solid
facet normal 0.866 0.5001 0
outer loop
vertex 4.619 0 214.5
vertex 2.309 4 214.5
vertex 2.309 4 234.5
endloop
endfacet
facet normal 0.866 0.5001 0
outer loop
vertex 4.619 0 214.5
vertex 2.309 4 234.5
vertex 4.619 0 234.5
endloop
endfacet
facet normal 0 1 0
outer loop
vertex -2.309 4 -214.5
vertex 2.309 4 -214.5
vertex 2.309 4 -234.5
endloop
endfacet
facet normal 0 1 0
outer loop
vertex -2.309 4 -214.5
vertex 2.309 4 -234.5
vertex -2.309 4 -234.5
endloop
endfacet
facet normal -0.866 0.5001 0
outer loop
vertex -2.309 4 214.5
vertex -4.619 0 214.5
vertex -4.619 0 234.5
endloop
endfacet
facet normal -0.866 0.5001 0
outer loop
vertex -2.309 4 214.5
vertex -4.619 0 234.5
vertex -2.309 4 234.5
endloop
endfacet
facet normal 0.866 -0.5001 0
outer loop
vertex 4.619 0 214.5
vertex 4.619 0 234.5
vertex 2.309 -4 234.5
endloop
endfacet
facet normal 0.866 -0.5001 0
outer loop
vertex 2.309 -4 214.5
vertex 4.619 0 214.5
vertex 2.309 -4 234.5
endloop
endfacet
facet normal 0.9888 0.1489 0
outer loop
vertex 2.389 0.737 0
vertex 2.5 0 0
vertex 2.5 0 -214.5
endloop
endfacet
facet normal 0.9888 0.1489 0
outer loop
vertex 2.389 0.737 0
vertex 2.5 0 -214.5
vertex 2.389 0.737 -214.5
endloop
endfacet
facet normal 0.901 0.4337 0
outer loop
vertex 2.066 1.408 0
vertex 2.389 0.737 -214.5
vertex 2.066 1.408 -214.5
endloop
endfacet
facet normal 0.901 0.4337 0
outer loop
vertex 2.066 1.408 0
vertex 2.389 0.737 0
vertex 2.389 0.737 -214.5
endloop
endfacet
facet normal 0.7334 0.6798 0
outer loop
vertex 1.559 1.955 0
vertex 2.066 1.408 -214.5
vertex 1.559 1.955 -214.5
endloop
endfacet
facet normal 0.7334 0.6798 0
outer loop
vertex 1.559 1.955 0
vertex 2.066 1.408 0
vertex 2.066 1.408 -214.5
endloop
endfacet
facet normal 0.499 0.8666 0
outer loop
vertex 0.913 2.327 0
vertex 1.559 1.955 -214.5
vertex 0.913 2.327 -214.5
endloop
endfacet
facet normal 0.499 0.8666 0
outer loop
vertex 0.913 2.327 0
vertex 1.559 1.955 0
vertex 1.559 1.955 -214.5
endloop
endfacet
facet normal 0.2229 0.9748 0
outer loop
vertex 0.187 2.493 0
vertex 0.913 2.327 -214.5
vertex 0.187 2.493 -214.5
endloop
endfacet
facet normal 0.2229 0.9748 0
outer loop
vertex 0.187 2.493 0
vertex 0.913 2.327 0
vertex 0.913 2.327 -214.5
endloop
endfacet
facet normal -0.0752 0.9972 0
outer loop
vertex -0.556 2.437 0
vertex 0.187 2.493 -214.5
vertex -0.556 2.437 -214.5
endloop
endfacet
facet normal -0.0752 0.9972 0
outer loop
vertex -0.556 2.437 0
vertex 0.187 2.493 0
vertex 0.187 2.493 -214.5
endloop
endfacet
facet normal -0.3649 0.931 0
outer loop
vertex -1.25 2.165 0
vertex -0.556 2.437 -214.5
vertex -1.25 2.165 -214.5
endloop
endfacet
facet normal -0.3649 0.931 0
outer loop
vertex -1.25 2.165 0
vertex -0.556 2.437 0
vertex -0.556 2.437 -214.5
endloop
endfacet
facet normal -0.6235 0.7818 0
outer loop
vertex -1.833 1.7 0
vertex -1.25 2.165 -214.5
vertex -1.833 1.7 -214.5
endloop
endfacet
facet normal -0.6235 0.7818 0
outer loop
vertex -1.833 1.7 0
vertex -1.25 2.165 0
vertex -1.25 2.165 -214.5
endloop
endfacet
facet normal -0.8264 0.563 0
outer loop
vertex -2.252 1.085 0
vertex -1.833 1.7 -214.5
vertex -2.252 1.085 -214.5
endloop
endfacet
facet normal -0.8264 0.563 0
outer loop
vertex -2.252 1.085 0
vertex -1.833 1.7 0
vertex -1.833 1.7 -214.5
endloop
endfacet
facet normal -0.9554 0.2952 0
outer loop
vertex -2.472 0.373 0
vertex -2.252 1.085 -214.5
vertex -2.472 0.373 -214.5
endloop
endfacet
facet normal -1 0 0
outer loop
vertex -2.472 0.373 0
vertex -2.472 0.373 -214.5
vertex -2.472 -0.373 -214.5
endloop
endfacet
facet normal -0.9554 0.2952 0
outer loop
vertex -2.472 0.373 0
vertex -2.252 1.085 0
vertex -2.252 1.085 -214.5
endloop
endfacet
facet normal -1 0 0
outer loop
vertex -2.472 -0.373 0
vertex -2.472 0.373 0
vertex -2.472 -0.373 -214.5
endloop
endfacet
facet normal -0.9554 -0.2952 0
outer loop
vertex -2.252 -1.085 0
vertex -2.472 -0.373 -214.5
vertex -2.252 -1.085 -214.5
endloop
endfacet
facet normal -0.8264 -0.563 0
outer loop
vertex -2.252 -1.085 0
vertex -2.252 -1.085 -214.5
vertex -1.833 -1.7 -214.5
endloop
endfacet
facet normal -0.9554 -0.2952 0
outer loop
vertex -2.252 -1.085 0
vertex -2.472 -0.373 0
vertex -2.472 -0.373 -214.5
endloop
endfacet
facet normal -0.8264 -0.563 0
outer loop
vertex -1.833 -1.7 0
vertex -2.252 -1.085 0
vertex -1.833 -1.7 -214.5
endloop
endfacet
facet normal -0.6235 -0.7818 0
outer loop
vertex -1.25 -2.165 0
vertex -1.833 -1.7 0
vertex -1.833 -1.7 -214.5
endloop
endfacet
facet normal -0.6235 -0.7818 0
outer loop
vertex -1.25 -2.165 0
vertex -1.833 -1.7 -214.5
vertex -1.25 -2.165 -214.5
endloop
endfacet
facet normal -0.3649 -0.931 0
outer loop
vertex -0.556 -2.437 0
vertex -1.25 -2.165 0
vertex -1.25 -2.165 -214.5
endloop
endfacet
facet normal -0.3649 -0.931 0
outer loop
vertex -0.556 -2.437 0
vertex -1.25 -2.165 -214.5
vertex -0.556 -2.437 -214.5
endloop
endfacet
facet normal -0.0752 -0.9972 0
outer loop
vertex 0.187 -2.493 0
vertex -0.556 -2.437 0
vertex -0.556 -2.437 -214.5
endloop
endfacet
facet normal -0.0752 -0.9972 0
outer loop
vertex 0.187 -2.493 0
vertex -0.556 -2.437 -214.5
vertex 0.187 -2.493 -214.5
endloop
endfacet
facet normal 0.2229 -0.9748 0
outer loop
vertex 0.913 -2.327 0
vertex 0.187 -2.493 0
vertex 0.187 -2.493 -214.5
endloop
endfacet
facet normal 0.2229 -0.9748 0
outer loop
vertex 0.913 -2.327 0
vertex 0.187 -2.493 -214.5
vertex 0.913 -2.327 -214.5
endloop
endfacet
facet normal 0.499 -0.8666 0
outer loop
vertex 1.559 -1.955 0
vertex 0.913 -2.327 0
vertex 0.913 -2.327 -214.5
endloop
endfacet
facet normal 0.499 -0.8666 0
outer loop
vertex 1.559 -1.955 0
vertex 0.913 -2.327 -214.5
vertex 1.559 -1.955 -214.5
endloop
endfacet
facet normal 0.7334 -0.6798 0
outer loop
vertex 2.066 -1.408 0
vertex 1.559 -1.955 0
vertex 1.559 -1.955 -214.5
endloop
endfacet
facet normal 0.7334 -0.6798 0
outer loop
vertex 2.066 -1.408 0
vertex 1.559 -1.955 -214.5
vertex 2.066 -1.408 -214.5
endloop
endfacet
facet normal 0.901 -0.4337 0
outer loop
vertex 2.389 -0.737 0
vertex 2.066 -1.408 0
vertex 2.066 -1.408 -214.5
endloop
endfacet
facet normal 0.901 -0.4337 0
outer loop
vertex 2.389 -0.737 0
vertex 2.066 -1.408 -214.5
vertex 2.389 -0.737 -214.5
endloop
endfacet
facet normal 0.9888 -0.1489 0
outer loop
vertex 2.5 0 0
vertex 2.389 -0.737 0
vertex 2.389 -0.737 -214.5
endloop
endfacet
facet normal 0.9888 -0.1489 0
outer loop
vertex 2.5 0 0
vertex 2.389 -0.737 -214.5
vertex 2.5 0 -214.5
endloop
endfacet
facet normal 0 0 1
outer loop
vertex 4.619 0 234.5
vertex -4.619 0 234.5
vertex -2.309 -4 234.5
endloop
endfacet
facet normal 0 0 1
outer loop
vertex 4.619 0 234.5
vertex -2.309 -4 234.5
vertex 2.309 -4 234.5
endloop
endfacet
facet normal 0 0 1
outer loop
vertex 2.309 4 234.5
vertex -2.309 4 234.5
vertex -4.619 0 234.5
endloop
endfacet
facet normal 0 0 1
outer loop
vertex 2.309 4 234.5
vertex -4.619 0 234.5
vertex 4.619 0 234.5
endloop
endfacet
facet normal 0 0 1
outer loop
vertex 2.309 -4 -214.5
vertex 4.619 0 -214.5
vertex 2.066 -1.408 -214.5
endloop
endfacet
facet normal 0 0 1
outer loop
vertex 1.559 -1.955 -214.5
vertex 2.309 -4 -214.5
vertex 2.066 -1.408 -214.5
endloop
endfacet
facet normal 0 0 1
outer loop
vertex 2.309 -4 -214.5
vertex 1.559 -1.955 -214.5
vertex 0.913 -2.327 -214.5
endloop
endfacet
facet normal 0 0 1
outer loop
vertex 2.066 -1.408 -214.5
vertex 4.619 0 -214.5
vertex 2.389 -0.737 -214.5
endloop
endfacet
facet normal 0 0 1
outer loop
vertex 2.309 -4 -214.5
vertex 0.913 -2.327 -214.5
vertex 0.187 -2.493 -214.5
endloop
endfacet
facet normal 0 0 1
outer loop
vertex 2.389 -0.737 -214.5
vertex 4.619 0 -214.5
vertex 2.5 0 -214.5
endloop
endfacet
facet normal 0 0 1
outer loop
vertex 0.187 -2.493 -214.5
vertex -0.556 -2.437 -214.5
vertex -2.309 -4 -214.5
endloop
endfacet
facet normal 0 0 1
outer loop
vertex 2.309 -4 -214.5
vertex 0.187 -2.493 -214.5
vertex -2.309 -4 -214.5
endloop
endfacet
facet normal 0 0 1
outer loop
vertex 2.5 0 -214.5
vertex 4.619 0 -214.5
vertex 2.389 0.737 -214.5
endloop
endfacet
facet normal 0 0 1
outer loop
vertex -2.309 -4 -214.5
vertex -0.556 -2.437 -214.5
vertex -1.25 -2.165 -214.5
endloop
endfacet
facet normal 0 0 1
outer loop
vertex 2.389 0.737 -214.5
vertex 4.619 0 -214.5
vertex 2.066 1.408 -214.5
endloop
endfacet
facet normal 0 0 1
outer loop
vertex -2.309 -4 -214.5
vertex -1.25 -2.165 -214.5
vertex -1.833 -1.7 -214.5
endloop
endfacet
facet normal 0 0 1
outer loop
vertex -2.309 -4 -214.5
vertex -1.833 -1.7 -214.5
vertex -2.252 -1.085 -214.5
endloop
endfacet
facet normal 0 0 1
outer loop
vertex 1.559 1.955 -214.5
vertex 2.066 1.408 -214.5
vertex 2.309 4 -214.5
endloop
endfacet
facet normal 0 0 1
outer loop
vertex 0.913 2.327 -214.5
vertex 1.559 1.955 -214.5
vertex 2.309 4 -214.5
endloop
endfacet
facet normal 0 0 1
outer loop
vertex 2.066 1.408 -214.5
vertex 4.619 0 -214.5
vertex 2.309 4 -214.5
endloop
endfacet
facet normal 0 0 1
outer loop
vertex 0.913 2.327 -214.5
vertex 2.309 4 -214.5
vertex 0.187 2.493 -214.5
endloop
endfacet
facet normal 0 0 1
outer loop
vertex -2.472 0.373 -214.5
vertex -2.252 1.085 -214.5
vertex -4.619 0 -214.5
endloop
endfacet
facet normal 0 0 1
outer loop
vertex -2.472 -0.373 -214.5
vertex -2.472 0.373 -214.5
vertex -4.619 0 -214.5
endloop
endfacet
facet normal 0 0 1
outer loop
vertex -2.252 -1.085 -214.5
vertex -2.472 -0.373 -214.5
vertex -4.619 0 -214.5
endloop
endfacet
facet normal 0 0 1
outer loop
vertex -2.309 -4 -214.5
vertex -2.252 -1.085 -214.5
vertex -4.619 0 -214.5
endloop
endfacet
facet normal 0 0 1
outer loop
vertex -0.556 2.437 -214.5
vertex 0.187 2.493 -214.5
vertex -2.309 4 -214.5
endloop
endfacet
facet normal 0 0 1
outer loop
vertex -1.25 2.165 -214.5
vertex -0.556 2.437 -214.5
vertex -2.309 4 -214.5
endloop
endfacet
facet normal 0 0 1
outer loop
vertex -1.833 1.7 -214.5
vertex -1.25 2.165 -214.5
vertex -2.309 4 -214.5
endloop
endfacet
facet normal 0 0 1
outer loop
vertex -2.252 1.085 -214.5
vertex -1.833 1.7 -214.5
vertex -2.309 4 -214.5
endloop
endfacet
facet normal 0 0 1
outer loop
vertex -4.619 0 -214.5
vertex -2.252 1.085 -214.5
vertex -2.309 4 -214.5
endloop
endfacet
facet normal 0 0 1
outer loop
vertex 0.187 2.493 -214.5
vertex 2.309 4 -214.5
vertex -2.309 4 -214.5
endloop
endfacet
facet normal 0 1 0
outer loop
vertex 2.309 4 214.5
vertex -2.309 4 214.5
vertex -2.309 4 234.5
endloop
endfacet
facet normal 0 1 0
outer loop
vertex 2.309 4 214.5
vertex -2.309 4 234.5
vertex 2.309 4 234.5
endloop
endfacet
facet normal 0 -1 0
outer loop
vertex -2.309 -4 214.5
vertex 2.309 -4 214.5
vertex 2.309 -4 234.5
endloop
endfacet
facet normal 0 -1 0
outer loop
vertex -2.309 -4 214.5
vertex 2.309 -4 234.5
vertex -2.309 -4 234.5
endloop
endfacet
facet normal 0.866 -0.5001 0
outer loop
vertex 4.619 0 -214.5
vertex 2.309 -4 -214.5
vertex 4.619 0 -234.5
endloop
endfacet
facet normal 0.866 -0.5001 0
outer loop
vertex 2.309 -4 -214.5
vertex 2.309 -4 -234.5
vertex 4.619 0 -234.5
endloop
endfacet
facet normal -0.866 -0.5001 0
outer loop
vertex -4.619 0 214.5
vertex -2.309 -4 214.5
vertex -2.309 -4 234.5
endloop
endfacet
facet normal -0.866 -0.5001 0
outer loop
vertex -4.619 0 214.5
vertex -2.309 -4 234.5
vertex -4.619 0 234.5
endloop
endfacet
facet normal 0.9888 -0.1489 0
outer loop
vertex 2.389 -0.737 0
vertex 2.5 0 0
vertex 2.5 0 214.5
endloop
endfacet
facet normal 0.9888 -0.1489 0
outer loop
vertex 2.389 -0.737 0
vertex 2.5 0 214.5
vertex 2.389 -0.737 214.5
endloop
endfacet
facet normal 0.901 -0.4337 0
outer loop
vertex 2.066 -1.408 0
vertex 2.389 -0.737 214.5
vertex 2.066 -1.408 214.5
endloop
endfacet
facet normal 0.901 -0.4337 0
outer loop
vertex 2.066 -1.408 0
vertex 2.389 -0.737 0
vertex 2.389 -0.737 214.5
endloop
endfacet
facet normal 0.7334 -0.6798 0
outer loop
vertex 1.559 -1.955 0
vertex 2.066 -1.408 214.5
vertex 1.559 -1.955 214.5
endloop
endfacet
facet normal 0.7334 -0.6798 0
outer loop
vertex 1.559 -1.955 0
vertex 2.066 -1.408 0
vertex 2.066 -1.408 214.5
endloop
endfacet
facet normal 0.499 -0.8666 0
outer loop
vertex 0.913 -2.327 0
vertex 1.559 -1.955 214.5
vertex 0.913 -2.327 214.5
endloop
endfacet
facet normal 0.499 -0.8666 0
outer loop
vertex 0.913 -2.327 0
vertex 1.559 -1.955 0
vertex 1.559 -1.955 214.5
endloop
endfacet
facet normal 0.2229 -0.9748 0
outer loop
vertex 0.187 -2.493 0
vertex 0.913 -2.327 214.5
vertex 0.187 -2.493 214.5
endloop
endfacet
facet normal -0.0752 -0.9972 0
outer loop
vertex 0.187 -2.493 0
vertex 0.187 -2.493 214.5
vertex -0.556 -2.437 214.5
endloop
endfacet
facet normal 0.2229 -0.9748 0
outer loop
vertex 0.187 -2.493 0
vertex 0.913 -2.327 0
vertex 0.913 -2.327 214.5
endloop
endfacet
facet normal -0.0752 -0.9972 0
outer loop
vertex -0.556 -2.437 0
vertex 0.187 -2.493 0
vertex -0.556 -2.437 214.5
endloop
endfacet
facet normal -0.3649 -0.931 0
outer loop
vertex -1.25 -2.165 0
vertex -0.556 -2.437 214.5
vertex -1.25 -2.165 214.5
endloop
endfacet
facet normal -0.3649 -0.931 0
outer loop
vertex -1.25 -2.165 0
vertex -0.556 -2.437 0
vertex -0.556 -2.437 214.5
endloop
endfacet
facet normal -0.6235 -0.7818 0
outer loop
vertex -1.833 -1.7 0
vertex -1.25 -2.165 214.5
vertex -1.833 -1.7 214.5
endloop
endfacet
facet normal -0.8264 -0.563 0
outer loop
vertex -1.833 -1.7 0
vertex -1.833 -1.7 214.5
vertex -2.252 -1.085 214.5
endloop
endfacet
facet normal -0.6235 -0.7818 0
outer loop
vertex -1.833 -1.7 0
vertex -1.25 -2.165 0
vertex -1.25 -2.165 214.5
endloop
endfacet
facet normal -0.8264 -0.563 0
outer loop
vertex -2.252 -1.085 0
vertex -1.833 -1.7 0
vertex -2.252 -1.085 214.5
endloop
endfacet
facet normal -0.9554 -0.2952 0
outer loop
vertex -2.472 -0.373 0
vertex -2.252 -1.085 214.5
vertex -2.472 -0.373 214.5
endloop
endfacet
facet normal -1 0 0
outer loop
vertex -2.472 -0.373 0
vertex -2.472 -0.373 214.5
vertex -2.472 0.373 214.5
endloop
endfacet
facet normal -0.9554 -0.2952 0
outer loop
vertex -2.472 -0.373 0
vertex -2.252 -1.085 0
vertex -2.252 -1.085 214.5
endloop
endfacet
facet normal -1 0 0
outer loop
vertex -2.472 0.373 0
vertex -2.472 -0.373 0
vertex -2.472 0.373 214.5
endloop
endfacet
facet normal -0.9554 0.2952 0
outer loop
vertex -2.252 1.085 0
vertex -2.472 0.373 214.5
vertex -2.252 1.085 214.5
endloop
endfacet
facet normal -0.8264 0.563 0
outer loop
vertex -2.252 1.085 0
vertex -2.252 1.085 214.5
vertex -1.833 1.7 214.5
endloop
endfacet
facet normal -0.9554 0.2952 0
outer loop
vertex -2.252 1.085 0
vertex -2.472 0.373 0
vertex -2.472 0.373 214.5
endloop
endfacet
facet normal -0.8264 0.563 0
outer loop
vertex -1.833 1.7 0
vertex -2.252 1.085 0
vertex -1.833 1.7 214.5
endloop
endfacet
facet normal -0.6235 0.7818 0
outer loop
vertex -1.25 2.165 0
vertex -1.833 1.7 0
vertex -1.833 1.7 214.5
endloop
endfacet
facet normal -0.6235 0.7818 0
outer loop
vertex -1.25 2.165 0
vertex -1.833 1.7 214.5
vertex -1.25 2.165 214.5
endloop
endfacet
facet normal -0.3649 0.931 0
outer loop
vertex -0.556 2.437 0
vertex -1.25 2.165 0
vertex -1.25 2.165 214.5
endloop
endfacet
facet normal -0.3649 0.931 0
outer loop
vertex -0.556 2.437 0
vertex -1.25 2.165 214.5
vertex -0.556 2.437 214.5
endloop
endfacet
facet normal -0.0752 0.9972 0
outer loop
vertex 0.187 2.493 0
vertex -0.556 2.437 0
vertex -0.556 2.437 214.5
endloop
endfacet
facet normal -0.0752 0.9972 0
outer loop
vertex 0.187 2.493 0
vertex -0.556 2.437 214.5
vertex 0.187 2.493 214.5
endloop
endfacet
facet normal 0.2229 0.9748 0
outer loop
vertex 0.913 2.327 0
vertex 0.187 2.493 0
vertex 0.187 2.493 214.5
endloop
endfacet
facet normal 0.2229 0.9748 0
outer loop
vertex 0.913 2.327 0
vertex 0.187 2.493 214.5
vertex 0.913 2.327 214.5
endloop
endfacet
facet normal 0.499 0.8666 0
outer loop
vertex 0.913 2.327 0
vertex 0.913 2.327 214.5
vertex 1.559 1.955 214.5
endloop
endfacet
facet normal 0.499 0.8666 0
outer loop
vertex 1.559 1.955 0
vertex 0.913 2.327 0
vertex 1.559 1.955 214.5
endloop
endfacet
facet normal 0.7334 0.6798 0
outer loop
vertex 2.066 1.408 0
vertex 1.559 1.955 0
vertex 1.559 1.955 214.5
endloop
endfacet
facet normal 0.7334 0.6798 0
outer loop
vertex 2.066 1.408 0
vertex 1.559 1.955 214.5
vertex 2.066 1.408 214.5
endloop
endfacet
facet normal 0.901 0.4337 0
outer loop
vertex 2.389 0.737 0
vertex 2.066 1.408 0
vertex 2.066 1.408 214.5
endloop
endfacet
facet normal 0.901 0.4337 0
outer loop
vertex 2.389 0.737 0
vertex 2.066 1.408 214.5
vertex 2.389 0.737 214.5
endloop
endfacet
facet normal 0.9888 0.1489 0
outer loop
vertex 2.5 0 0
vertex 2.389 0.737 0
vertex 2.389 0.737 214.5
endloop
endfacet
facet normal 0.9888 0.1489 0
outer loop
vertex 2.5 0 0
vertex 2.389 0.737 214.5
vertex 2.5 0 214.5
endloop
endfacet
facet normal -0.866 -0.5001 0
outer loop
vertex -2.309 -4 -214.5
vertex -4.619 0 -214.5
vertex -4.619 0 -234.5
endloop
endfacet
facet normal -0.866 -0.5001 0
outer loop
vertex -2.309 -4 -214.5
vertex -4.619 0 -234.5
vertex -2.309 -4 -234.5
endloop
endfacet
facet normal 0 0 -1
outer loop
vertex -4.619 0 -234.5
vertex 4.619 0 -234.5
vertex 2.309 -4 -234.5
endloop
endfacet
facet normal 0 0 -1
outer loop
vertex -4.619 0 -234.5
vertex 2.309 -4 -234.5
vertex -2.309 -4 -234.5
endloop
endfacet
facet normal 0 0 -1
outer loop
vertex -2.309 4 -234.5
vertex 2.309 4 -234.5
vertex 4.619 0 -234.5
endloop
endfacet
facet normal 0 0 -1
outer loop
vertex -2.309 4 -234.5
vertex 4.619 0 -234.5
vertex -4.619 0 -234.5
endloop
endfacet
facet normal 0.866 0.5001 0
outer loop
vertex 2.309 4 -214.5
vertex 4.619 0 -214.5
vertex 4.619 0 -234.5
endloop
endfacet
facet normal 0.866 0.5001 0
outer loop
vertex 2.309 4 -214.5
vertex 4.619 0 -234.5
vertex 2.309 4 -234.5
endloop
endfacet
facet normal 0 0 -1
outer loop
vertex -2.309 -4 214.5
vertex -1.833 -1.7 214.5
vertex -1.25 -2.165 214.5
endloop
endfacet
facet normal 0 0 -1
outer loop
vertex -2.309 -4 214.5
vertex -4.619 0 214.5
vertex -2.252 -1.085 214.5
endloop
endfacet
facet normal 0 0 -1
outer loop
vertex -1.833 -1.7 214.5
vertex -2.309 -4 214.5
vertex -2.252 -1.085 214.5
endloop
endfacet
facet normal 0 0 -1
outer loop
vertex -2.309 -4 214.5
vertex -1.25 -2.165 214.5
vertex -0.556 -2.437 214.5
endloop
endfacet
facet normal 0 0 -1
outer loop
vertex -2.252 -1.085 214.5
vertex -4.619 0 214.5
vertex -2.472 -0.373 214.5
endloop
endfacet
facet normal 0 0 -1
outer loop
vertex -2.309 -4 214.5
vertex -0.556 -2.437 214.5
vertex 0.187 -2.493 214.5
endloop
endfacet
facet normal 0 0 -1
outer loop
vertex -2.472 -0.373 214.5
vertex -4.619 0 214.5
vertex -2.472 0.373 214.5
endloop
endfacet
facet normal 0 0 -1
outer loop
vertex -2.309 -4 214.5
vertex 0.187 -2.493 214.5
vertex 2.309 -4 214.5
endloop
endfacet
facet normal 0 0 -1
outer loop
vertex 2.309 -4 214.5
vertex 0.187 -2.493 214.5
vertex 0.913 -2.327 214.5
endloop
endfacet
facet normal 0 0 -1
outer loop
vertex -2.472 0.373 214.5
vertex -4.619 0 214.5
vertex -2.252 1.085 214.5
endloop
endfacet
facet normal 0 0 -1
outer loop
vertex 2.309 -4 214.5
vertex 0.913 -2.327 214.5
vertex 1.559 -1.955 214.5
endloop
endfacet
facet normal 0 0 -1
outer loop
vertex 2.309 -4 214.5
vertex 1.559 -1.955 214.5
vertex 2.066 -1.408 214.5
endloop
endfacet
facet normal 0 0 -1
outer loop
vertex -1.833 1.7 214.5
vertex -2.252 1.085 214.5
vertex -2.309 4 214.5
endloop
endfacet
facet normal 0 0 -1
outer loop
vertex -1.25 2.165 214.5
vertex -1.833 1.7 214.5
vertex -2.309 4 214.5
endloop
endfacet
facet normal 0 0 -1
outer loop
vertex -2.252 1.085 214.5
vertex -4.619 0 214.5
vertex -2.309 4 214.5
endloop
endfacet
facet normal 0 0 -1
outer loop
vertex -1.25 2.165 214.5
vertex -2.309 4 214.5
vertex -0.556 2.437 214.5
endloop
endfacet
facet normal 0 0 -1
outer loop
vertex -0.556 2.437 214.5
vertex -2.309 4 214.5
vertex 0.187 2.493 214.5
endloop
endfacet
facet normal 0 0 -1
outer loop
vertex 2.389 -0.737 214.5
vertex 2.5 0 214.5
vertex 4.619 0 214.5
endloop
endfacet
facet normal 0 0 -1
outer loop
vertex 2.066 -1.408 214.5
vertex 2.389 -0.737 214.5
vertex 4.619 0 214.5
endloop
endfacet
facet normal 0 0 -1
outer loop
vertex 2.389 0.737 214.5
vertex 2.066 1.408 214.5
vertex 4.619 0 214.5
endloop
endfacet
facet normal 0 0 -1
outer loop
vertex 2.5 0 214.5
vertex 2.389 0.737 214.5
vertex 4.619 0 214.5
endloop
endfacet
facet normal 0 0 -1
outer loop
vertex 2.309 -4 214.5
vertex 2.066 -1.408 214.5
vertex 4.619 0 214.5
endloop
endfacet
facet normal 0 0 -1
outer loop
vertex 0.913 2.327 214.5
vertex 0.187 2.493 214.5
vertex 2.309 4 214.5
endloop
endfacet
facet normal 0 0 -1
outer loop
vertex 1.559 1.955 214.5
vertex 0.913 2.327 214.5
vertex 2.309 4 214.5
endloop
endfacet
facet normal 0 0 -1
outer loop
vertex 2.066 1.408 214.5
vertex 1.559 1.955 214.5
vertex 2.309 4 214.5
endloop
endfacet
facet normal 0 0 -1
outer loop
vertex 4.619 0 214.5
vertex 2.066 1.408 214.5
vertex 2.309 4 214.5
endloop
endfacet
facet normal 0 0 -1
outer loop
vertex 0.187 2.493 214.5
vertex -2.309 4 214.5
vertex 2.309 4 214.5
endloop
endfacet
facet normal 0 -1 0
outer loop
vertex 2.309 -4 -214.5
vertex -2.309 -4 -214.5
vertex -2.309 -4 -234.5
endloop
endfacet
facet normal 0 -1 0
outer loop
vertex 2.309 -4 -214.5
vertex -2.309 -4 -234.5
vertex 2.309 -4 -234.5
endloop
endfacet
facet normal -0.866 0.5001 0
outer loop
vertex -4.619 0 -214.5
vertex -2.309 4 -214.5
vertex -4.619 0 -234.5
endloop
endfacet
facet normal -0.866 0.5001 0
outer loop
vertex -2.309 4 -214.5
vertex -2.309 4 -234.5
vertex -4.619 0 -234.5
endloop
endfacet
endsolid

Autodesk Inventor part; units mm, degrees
ref_plane "YZ Plane" through (0, 0, 0) normal (1, 0, 0) x (0, 1, 0)
ref_plane "XZ Plane" through (0, 0, 0) normal (0, 1, 0) x (-1, 0, 0)
ref_plane "XY Plane" through (0, 0, 0) normal (0, 0, 1) x (1, 0, 0)
sketch "Skizze1" plane through (0, 0, 0) normal (0, 0, 1) x (1, 0, 0)
  circle A0 centre (0, 0) radius 2.5
  dimension "d0" = 5
extrude "Extrusion1" add sketch "Skizze1" along normal mid plane 469
sketch "Skizze2" plane through (0, 0, 234.5) normal (0, 0, 1) x (1, 0, 0)
  line L0 (-2.3094, 4) -> (2.3094, 4)
  line L1 (2.3094, 4) -> (4.6188, 0)
  line L2 (4.6188, 0) -> (2.3094, -4)
  line L3 (2.3094, -4) -> (-2.3094, -4)
  line L4 (-2.3094, -4) -> (-4.6188, 0)
  line L5 (-4.6188, 0) -> (-2.3094, 4)
  point P0 (0, 0)
  point P1 (0, 0)
  dimension "d3" = 8
extrude "Extrusion2" add sketch "Skizze2" against normal blind 20
mirror "Spiegeln1" about plane through (0, 0, 0) normal (0, 0, 1) of "Extrusion2"
properties part number "Door Axis" material "Edelstahl"
